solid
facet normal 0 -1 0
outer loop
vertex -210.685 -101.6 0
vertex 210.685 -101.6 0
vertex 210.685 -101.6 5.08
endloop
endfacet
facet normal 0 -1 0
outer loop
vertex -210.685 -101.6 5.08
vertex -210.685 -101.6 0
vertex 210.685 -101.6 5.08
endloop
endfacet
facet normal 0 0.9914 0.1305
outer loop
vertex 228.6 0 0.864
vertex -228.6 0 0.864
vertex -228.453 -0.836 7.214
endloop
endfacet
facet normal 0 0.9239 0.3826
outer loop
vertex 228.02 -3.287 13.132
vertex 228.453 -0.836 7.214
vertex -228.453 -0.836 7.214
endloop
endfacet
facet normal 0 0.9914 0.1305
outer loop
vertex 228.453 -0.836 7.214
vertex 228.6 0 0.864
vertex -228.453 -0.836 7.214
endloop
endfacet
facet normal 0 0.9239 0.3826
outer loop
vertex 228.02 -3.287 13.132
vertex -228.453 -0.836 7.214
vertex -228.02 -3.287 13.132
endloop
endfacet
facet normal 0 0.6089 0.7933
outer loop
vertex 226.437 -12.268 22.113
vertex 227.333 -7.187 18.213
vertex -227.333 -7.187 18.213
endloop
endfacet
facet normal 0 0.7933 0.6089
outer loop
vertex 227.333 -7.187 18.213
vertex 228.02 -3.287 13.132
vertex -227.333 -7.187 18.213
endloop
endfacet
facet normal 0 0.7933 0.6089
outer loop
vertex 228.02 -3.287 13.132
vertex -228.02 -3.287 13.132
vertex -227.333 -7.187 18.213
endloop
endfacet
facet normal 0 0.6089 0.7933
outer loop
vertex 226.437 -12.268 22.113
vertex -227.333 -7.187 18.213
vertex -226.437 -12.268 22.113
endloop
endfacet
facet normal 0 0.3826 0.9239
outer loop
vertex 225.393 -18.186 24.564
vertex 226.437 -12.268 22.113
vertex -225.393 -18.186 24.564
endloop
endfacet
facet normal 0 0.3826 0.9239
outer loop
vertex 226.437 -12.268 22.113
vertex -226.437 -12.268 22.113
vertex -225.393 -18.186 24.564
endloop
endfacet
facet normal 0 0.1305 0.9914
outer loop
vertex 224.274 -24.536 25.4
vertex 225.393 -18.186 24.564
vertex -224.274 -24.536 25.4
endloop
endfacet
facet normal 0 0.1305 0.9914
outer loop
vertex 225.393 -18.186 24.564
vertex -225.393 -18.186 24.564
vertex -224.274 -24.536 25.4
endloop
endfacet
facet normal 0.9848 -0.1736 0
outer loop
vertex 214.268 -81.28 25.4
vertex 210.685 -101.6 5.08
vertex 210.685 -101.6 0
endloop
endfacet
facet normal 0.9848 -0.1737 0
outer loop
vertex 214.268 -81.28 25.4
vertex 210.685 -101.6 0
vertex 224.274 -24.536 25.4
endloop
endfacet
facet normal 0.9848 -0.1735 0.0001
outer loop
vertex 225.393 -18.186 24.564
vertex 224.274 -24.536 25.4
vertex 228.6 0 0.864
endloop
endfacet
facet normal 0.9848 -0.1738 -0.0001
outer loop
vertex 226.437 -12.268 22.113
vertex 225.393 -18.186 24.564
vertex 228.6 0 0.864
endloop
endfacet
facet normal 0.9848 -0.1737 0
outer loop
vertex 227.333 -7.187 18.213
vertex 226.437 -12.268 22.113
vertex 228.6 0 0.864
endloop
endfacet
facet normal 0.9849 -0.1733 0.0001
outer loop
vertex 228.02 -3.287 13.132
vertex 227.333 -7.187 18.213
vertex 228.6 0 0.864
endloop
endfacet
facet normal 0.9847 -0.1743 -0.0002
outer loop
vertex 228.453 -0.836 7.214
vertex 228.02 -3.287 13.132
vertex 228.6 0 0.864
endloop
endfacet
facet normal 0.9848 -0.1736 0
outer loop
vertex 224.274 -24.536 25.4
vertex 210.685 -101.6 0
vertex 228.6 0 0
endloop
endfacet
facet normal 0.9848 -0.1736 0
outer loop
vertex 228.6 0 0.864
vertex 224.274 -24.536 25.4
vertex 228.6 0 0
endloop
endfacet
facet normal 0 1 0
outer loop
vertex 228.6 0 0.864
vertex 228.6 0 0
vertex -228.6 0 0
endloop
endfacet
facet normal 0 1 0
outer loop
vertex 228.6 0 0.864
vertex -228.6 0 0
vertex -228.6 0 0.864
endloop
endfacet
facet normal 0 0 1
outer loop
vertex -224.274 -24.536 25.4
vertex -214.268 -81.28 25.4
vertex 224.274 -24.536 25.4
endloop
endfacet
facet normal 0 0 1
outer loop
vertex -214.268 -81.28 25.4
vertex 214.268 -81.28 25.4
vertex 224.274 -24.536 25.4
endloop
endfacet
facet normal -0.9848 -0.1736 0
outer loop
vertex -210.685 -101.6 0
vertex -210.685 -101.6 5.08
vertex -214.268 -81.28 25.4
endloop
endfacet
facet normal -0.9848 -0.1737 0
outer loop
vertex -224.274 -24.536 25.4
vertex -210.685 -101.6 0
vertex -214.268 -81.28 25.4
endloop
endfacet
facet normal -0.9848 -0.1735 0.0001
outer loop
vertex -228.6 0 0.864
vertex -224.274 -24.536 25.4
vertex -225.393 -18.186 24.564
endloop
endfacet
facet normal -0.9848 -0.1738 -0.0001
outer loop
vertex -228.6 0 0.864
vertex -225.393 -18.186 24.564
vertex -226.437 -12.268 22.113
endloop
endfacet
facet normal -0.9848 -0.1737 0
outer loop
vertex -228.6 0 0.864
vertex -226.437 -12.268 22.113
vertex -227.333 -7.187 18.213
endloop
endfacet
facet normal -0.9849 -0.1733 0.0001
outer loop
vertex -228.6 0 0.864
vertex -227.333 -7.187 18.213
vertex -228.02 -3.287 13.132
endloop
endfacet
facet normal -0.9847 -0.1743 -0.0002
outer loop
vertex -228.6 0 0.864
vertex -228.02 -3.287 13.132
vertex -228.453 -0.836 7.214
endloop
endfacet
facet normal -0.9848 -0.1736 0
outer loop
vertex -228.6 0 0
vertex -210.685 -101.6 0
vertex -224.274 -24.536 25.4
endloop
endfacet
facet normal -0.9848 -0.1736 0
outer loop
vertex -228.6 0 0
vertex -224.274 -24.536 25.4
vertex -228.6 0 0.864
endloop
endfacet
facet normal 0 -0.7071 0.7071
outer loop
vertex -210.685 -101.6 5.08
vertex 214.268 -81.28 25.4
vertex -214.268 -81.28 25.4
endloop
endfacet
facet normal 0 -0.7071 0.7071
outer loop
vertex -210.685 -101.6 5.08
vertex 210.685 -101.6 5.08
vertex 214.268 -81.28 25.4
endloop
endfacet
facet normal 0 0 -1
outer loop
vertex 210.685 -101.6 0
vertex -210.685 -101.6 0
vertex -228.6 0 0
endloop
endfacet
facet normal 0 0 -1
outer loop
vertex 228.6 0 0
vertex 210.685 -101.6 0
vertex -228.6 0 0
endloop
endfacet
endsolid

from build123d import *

# Parameters (mm, degrees)
F0_W     = 101.6
F0_H     = 25.4
F1_DEPTH = 228.6
F2_R     = 24.5364
F4_DEPTH = 25.4
F5_SIZE  = 20.32


with BuildPart() as f1:
    # F0 (on Right) → F1 (new body)
    with BuildSketch(Plane.YZ):
        with Locations((-50.8, 12.7)):
            Rectangle(F0_W, F0_H)
    extrude(amount=F1_DEPTH)

    # F2
    f2_edges = [f1.edges().sort_by_distance(p)[0] for p in [
        (114.3, 0, 25.4),
    ]]
    fillet(f2_edges, radius=F2_R)

    # F3 (on face) → F4 (cut)
    with BuildSketch(Plane(origin=(0, 0, 0), x_dir=(1, 0, 0), z_dir=(0, 0, -1))):
        Polygon((210.685179, 101.6), (228.6, 0), (228.6, 101.6), align=None)
    extrude(amount=-F4_DEPTH, mode=Mode.SUBTRACT)

    # F5
    f5_edges = [f1.edges().sort_by_distance(p)[0] for p in [
        (105.342589, -101.6, 25.4),
    ]]
    chamfer(f5_edges, length=F5_SIZE)

    # F6: F1 across plane


with BuildPart() as f1_1:
    add(f1.part)
    add(f1.part.mirror(Plane.YZ))


solid = f1_1.part
